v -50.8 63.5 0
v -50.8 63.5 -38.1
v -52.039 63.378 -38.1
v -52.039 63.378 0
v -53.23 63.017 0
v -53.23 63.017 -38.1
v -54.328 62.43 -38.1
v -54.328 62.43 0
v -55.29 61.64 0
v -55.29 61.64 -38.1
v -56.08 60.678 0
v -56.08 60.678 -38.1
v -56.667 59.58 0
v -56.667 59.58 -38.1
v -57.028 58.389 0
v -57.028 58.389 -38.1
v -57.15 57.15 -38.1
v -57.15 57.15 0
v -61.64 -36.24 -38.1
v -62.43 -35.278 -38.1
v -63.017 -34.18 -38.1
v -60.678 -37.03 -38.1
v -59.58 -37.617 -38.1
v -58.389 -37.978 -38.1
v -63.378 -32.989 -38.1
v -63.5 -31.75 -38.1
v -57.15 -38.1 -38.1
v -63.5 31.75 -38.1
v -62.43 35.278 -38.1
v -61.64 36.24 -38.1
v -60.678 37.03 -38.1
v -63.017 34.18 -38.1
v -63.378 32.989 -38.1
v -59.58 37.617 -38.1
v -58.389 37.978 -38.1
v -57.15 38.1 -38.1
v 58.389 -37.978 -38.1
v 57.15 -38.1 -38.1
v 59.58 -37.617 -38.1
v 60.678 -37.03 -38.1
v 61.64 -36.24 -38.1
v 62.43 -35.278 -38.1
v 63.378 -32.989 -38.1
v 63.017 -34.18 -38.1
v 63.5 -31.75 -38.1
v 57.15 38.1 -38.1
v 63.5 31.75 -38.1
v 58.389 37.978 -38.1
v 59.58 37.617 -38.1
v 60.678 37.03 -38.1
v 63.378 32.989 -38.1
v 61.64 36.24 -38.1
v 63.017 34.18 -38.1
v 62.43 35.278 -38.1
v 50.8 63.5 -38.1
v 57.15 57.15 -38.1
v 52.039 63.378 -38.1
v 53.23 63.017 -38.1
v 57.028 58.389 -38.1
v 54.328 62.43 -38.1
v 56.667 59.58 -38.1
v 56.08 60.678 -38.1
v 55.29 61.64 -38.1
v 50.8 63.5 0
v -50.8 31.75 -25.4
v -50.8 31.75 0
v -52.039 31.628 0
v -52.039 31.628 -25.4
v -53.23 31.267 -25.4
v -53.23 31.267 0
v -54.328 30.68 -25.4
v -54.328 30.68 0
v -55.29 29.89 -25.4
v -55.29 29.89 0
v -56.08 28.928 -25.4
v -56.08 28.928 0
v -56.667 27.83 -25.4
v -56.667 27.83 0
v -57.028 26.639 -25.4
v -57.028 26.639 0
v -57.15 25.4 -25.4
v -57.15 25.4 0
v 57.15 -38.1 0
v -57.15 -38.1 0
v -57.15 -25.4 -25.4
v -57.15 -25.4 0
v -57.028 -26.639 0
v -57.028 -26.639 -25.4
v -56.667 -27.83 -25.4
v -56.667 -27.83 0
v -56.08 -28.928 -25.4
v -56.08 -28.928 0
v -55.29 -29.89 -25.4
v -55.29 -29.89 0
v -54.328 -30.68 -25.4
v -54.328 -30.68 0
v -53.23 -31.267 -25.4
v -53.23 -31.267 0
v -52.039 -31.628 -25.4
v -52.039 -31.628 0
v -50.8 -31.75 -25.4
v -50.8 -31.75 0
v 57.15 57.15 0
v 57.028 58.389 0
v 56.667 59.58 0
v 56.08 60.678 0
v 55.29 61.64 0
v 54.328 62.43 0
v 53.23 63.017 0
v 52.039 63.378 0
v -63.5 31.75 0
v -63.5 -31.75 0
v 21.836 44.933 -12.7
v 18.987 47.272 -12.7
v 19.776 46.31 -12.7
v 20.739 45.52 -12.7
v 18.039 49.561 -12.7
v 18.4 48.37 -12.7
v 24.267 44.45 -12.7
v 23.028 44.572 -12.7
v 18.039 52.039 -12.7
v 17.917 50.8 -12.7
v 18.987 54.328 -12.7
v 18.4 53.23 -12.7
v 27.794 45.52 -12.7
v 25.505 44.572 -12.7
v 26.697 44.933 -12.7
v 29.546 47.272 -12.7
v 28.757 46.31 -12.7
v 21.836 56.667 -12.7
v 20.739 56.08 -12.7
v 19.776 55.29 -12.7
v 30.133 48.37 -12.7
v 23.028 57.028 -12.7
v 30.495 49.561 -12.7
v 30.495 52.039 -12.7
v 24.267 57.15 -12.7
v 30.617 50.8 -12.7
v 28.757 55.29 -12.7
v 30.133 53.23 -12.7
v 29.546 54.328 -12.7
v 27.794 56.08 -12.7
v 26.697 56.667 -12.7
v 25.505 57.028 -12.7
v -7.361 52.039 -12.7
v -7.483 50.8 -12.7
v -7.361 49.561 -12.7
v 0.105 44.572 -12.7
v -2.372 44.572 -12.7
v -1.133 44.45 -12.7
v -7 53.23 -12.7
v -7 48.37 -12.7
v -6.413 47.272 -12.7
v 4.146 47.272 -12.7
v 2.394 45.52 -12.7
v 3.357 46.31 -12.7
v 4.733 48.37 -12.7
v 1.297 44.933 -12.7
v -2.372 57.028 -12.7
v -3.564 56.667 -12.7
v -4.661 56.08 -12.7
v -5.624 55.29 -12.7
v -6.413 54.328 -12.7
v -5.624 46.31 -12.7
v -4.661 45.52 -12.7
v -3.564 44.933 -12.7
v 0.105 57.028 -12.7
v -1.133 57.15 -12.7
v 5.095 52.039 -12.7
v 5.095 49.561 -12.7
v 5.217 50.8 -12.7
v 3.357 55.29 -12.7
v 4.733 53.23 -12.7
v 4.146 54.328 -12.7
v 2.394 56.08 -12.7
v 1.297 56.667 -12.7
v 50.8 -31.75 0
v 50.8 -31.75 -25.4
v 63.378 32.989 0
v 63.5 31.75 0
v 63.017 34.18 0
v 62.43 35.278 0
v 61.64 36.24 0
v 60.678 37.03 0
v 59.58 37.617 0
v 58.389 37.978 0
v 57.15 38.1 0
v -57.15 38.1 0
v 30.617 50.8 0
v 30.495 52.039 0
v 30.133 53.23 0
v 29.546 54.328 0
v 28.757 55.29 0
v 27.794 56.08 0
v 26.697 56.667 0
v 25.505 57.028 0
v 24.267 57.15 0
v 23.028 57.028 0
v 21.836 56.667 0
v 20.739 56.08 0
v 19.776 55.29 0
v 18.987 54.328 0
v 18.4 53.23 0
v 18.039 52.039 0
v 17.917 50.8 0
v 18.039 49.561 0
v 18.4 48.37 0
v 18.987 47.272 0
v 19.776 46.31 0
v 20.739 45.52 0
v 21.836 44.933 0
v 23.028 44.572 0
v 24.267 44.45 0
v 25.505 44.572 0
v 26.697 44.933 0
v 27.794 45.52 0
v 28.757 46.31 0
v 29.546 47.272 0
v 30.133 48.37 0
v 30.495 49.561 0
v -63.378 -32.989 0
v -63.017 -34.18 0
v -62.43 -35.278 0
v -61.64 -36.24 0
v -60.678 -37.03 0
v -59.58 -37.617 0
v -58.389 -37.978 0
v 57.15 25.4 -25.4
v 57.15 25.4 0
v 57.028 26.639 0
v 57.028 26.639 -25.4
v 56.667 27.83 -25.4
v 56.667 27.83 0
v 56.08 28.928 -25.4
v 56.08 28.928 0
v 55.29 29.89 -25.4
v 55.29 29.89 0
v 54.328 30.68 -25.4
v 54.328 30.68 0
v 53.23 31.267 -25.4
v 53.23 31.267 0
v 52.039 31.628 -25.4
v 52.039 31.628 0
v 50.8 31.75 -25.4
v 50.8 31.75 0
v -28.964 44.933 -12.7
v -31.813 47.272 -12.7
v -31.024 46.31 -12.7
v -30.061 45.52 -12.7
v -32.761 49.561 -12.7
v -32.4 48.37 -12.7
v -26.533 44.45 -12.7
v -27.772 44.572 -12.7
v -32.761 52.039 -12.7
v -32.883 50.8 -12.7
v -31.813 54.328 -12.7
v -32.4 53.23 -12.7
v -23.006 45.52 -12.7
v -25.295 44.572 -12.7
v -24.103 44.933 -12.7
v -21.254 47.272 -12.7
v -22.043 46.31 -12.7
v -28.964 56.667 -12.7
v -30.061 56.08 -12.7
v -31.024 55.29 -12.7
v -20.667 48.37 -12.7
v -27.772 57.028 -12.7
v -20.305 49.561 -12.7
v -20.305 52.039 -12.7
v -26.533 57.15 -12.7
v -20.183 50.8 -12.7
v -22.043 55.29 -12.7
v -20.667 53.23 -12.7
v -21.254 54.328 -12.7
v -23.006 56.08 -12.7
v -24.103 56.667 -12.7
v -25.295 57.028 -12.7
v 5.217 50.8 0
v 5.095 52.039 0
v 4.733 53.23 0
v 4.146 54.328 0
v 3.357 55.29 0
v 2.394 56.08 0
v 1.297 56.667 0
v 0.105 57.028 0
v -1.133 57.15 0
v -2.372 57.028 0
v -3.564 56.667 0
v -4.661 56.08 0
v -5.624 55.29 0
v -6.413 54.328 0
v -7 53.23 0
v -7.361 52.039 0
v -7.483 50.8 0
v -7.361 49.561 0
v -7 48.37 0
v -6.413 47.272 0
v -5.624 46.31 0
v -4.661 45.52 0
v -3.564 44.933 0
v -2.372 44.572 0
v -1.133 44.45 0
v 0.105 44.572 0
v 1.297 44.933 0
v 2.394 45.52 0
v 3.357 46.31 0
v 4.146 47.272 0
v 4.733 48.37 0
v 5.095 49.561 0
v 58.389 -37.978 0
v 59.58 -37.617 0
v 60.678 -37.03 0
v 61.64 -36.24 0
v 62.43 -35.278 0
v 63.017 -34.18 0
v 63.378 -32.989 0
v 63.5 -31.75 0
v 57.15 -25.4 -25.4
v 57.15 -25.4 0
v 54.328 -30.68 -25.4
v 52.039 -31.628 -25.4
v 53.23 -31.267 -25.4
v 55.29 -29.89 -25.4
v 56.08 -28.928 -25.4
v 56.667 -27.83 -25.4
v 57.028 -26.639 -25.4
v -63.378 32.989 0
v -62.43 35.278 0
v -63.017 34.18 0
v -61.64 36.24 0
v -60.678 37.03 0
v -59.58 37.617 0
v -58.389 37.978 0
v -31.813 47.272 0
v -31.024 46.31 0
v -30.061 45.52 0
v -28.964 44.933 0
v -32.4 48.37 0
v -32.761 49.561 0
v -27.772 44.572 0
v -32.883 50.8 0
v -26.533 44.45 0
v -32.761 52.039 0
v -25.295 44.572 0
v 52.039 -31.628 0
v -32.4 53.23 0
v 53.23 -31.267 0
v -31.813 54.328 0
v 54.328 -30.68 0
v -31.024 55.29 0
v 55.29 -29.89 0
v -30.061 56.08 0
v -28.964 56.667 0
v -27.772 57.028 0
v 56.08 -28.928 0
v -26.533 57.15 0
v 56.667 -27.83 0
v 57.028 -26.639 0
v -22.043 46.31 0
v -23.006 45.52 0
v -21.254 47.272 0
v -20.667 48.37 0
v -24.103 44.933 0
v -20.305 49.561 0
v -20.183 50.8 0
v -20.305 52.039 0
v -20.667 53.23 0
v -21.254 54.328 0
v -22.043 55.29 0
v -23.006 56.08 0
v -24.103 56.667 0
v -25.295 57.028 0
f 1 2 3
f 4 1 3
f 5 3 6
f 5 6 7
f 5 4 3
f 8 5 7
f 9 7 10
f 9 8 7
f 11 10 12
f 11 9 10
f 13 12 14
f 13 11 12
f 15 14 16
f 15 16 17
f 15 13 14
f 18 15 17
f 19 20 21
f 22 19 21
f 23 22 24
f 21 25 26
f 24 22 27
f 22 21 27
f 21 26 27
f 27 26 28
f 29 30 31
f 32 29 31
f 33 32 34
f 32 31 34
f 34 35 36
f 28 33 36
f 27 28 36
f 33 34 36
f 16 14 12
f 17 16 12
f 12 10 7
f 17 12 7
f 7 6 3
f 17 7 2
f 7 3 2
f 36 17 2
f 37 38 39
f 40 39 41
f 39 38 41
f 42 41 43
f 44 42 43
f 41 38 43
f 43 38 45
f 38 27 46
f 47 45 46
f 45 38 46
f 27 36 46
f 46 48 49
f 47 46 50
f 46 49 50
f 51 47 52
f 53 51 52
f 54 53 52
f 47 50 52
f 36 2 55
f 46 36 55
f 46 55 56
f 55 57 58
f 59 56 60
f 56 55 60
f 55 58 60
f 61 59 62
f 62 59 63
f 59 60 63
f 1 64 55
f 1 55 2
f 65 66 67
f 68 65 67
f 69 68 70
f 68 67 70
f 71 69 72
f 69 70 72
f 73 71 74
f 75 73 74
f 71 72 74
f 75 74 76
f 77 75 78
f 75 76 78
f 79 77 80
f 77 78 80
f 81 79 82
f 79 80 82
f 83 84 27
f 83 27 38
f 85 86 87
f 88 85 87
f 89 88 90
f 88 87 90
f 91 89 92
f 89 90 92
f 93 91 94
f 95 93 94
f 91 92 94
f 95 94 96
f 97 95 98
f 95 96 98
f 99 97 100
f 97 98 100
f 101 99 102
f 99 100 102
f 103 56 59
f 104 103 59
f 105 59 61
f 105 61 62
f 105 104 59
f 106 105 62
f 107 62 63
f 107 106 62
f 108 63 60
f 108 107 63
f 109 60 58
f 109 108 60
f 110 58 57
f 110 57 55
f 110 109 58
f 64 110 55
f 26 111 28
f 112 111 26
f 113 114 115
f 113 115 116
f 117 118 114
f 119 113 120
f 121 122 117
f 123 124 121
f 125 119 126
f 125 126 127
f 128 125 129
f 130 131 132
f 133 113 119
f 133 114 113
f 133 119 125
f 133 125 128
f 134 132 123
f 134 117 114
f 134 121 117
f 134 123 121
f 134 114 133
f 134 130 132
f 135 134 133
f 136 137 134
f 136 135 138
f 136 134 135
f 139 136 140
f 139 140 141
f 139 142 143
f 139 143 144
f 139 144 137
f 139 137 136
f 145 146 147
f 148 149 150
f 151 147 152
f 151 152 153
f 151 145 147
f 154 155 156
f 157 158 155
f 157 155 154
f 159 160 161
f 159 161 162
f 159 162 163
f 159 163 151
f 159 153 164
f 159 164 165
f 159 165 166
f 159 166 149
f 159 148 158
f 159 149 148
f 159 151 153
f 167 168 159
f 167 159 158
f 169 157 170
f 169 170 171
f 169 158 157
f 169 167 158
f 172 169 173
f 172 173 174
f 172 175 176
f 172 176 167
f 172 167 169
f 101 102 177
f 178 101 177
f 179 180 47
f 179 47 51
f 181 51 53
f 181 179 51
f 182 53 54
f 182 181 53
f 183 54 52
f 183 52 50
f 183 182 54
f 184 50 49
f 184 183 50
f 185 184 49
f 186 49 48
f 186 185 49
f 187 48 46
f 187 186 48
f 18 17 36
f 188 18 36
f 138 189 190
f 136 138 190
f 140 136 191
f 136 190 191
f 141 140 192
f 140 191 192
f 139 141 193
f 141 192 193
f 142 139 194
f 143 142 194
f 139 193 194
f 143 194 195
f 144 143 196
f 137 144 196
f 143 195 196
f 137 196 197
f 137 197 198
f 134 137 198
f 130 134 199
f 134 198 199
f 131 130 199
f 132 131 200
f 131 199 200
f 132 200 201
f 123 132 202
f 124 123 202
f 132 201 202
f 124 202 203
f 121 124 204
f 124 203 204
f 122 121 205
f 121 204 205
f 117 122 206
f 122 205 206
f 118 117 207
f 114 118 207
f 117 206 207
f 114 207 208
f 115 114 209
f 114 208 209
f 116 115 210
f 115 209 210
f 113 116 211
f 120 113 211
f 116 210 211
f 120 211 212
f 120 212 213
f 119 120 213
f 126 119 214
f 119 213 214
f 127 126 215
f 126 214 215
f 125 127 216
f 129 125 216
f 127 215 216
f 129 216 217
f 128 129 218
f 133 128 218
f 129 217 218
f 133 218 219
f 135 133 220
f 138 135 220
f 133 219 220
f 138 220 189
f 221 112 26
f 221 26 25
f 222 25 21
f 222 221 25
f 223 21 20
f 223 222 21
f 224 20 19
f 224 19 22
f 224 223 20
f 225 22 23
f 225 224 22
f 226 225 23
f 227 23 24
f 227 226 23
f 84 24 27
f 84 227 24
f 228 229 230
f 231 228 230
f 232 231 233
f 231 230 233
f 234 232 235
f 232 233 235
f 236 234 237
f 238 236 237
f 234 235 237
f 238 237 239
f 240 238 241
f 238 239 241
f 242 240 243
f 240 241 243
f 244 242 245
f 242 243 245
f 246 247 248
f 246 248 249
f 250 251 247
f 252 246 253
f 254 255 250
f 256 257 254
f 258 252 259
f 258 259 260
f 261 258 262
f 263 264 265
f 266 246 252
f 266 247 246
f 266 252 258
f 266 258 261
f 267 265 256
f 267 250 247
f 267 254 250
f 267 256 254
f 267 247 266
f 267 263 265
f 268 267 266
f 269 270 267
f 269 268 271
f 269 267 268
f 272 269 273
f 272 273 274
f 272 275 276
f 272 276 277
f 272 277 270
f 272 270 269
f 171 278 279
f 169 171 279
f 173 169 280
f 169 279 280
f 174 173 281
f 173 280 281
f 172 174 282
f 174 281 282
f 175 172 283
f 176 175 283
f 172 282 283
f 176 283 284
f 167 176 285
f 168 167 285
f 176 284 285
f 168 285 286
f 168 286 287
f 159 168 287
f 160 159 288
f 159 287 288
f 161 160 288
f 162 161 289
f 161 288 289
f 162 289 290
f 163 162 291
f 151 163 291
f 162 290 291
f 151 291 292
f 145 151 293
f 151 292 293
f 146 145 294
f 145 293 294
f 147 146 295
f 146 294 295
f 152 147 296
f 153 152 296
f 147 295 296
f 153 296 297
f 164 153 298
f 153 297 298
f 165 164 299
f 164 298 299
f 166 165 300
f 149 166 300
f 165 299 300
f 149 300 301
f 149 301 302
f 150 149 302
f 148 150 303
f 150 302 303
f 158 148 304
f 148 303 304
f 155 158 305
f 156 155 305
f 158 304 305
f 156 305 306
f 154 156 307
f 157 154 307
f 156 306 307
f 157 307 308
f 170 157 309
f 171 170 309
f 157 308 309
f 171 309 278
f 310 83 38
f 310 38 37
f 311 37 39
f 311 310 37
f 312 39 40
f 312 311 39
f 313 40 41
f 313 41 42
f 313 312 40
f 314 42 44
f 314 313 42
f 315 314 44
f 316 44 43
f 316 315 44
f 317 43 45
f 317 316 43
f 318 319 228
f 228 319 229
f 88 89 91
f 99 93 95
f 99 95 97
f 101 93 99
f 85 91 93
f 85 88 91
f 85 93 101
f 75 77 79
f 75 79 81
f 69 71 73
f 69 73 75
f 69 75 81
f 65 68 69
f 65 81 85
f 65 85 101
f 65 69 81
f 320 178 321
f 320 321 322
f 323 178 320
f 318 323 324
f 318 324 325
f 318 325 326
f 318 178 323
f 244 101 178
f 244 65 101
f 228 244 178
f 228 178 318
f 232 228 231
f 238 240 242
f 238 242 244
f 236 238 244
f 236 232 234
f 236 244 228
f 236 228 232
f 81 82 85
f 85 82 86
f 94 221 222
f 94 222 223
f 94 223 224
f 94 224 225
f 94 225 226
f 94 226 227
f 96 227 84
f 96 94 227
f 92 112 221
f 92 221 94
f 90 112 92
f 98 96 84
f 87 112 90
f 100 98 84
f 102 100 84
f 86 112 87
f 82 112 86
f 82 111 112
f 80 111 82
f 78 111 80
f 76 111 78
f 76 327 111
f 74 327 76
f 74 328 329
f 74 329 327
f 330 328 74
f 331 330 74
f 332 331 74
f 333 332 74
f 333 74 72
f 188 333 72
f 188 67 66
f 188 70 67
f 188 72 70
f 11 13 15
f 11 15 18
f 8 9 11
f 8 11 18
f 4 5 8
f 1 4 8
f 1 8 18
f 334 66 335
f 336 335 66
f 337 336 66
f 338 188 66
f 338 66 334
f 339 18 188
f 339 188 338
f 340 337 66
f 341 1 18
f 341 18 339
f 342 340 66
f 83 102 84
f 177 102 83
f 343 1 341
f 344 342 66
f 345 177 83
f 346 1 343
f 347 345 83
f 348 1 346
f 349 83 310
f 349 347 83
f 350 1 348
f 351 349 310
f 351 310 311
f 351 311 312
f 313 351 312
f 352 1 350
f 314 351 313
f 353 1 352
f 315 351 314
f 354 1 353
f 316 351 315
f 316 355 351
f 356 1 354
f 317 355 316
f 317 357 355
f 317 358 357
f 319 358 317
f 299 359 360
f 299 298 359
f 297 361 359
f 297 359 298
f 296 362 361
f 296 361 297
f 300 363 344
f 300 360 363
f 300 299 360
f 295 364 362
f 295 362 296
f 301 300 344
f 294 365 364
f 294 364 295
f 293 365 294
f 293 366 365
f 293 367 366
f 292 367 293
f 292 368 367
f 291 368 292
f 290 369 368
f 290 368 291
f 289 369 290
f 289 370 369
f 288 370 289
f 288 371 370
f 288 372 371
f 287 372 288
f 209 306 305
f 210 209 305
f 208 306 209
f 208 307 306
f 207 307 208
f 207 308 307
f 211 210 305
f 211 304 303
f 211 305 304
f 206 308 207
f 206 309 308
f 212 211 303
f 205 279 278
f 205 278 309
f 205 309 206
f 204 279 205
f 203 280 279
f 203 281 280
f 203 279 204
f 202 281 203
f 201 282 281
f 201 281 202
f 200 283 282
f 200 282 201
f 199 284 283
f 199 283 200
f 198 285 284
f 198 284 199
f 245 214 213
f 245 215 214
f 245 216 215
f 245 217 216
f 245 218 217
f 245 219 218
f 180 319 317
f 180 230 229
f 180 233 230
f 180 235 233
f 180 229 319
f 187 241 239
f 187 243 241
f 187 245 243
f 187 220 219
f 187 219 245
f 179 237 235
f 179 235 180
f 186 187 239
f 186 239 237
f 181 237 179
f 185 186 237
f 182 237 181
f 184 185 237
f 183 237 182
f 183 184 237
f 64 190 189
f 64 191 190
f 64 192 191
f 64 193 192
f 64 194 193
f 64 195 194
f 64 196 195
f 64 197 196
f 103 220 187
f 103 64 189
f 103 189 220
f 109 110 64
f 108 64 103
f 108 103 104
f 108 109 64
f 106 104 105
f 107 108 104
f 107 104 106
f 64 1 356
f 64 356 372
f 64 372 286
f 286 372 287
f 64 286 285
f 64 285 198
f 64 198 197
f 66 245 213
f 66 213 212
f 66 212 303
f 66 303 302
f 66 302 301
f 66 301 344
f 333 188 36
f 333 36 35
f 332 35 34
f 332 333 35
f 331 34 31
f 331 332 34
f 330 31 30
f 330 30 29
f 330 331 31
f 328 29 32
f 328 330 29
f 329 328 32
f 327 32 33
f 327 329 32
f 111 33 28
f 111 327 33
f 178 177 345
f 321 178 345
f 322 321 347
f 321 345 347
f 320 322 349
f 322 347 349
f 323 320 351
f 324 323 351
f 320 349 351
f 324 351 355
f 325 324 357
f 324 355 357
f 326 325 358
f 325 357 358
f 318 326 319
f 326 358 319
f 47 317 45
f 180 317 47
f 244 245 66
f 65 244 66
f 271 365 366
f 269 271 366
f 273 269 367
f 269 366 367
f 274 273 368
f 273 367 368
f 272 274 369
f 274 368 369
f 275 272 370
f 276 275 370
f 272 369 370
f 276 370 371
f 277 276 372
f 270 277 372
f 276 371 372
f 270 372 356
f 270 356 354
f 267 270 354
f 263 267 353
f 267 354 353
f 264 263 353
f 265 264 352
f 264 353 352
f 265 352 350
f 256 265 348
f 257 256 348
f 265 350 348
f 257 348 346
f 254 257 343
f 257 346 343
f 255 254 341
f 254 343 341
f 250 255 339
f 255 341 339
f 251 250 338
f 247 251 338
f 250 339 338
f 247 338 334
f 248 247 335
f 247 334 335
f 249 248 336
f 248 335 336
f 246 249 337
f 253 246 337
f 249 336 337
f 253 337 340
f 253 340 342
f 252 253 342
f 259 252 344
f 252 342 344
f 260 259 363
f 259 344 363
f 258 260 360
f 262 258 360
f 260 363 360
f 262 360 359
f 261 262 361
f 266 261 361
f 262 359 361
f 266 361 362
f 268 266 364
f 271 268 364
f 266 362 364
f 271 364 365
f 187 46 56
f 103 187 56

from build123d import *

# Parameters (mm, degrees)
F0_R     = 6.35
F1_DEPTH = 38.1
F2_DEPTH = 25.4
F3_DEPTH = 12.7


with BuildPart() as f1:
    # F0 (on Top) → F1 (new body)
    with BuildSketch(Plane.XY):
        with BuildLine():
            ThreePointArc((-63.5, -31.75), (-61.6401280605, -36.2401280605), (-57.15, -38.1))
            Line((-57.15, -38.1), (57.15, -38.1))
            ThreePointArc((57.15, -38.1), (61.6401280605, -36.2401280605), (63.5, -31.75))
            Line((63.5, -31.75), (63.5, 31.75))
            ThreePointArc((63.5, 31.75), (61.6401280605, 36.2401280605), (57.15, 38.1))
            Line((57.15, 38.1), (-57.15, 38.1))
            ThreePointArc((-57.15, 38.1), (-61.6401280605, 36.2401280605), (-63.5, 31.75))
            Line((-63.5, 31.75), (-63.5, -31.75))
        make_face()
        with BuildLine():
            ThreePointArc((-57.15, 25.4), (-55.2901280605, 29.8901280605), (-50.8, 31.75))
            Line((-50.8, 31.75), (50.8, 31.75))
            ThreePointArc((50.8, 31.75), (55.2901280605, 29.8901280605), (57.15, 25.4))
            Line((57.15, 25.4), (57.15, -25.4))
            ThreePointArc((57.15, -25.4), (55.2901280605, -29.8901280605), (50.8, -31.75))
            Line((50.8, -31.75), (-50.8, -31.75))
            ThreePointArc((-50.8, -31.75), (-55.2901280605, -29.8901280605), (-57.15, -25.4))
            Line((-57.15, -25.4), (-57.15, 25.4))
        make_face(mode=Mode.SUBTRACT)
        with BuildLine():
            Line((50.8, 31.75), (-50.8, 31.75))
            ThreePointArc((-50.8, 31.75), (-55.2901280605, 29.8901280605), (-57.15, 25.4))
            Line((-57.15, 25.4), (-57.15, -25.4))
            ThreePointArc((-57.15, -25.4), (-55.2901280605, -29.8901280605), (-50.8, -31.75))
            Line((-50.8, -31.75), (50.8, -31.75))
            ThreePointArc((50.8, -31.75), (55.2901280605, -29.8901280605), (57.15, -25.4))
            Line((57.15, -25.4), (57.15, 25.4))
            ThreePointArc((57.15, 25.4), (55.2901280605, 29.8901280605), (50.8, 31.75))
        make_face()
        with BuildLine():
            Line((-57.15, 57.15), (-57.15, 38.1))
            Line((-57.15, 38.1), (57.15, 38.1))
            Line((57.15, 38.1), (57.15, 57.15))
            ThreePointArc((57.15, 57.15), (55.2901280605, 61.6401280605), (50.8, 63.5))
            Line((50.8, 63.5), (-50.8, 63.5))
            ThreePointArc((-50.8, 63.5), (-55.2901280605, 61.6401280605), (-57.15, 57.15))
        make_face()
        with Locations((-26.5334639698, 50.8)):
            Circle(F0_R, mode=Mode.SUBTRACT)
        with Locations((-1.1334639698, 50.8)):
            Circle(F0_R, mode=Mode.SUBTRACT)
        with Locations((24.2665360302, 50.8)):
            Circle(F0_R, mode=Mode.SUBTRACT)
        with Locations((-26.5334639698, 50.8)):
            Circle(F0_R)
        with Locations((-1.1334639698, 50.8)):
            Circle(F0_R)
        with Locations((24.2665360302, 50.8)):
            Circle(F0_R)
    extrude(amount=-F1_DEPTH)

    # F0 (on Top) → F2 (cut)
    with BuildSketch(Plane.XY):
        with BuildLine():
            Line((50.8, 31.75), (-50.8, 31.75))
            ThreePointArc((-50.8, 31.75), (-55.2901280605, 29.8901280605), (-57.15, 25.4))
            Line((-57.15, 25.4), (-57.15, -25.4))
            ThreePointArc((-57.15, -25.4), (-55.2901280605, -29.8901280605), (-50.8, -31.75))
            Line((-50.8, -31.75), (50.8, -31.75))
            ThreePointArc((50.8, -31.75), (55.2901280605, -29.8901280605), (57.15, -25.4))
            Line((57.15, -25.4), (57.15, 25.4))
            ThreePointArc((57.15, 25.4), (55.2901280605, 29.8901280605), (50.8, 31.75))
        make_face()
    extrude(amount=-F2_DEPTH, mode=Mode.SUBTRACT)

    # F0 (on Top) → F3 (cut)
    with BuildSketch(Plane.XY):
        with Locations((-26.5334639698, 50.8)):
            Circle(F0_R)
        with Locations((-1.1334639698, 50.8)):
            Circle(F0_R)
        with Locations((24.2665360302, 50.8)):
            Circle(F0_R)
    extrude(amount=-F3_DEPTH, mode=Mode.SUBTRACT)


solid = f1.part
